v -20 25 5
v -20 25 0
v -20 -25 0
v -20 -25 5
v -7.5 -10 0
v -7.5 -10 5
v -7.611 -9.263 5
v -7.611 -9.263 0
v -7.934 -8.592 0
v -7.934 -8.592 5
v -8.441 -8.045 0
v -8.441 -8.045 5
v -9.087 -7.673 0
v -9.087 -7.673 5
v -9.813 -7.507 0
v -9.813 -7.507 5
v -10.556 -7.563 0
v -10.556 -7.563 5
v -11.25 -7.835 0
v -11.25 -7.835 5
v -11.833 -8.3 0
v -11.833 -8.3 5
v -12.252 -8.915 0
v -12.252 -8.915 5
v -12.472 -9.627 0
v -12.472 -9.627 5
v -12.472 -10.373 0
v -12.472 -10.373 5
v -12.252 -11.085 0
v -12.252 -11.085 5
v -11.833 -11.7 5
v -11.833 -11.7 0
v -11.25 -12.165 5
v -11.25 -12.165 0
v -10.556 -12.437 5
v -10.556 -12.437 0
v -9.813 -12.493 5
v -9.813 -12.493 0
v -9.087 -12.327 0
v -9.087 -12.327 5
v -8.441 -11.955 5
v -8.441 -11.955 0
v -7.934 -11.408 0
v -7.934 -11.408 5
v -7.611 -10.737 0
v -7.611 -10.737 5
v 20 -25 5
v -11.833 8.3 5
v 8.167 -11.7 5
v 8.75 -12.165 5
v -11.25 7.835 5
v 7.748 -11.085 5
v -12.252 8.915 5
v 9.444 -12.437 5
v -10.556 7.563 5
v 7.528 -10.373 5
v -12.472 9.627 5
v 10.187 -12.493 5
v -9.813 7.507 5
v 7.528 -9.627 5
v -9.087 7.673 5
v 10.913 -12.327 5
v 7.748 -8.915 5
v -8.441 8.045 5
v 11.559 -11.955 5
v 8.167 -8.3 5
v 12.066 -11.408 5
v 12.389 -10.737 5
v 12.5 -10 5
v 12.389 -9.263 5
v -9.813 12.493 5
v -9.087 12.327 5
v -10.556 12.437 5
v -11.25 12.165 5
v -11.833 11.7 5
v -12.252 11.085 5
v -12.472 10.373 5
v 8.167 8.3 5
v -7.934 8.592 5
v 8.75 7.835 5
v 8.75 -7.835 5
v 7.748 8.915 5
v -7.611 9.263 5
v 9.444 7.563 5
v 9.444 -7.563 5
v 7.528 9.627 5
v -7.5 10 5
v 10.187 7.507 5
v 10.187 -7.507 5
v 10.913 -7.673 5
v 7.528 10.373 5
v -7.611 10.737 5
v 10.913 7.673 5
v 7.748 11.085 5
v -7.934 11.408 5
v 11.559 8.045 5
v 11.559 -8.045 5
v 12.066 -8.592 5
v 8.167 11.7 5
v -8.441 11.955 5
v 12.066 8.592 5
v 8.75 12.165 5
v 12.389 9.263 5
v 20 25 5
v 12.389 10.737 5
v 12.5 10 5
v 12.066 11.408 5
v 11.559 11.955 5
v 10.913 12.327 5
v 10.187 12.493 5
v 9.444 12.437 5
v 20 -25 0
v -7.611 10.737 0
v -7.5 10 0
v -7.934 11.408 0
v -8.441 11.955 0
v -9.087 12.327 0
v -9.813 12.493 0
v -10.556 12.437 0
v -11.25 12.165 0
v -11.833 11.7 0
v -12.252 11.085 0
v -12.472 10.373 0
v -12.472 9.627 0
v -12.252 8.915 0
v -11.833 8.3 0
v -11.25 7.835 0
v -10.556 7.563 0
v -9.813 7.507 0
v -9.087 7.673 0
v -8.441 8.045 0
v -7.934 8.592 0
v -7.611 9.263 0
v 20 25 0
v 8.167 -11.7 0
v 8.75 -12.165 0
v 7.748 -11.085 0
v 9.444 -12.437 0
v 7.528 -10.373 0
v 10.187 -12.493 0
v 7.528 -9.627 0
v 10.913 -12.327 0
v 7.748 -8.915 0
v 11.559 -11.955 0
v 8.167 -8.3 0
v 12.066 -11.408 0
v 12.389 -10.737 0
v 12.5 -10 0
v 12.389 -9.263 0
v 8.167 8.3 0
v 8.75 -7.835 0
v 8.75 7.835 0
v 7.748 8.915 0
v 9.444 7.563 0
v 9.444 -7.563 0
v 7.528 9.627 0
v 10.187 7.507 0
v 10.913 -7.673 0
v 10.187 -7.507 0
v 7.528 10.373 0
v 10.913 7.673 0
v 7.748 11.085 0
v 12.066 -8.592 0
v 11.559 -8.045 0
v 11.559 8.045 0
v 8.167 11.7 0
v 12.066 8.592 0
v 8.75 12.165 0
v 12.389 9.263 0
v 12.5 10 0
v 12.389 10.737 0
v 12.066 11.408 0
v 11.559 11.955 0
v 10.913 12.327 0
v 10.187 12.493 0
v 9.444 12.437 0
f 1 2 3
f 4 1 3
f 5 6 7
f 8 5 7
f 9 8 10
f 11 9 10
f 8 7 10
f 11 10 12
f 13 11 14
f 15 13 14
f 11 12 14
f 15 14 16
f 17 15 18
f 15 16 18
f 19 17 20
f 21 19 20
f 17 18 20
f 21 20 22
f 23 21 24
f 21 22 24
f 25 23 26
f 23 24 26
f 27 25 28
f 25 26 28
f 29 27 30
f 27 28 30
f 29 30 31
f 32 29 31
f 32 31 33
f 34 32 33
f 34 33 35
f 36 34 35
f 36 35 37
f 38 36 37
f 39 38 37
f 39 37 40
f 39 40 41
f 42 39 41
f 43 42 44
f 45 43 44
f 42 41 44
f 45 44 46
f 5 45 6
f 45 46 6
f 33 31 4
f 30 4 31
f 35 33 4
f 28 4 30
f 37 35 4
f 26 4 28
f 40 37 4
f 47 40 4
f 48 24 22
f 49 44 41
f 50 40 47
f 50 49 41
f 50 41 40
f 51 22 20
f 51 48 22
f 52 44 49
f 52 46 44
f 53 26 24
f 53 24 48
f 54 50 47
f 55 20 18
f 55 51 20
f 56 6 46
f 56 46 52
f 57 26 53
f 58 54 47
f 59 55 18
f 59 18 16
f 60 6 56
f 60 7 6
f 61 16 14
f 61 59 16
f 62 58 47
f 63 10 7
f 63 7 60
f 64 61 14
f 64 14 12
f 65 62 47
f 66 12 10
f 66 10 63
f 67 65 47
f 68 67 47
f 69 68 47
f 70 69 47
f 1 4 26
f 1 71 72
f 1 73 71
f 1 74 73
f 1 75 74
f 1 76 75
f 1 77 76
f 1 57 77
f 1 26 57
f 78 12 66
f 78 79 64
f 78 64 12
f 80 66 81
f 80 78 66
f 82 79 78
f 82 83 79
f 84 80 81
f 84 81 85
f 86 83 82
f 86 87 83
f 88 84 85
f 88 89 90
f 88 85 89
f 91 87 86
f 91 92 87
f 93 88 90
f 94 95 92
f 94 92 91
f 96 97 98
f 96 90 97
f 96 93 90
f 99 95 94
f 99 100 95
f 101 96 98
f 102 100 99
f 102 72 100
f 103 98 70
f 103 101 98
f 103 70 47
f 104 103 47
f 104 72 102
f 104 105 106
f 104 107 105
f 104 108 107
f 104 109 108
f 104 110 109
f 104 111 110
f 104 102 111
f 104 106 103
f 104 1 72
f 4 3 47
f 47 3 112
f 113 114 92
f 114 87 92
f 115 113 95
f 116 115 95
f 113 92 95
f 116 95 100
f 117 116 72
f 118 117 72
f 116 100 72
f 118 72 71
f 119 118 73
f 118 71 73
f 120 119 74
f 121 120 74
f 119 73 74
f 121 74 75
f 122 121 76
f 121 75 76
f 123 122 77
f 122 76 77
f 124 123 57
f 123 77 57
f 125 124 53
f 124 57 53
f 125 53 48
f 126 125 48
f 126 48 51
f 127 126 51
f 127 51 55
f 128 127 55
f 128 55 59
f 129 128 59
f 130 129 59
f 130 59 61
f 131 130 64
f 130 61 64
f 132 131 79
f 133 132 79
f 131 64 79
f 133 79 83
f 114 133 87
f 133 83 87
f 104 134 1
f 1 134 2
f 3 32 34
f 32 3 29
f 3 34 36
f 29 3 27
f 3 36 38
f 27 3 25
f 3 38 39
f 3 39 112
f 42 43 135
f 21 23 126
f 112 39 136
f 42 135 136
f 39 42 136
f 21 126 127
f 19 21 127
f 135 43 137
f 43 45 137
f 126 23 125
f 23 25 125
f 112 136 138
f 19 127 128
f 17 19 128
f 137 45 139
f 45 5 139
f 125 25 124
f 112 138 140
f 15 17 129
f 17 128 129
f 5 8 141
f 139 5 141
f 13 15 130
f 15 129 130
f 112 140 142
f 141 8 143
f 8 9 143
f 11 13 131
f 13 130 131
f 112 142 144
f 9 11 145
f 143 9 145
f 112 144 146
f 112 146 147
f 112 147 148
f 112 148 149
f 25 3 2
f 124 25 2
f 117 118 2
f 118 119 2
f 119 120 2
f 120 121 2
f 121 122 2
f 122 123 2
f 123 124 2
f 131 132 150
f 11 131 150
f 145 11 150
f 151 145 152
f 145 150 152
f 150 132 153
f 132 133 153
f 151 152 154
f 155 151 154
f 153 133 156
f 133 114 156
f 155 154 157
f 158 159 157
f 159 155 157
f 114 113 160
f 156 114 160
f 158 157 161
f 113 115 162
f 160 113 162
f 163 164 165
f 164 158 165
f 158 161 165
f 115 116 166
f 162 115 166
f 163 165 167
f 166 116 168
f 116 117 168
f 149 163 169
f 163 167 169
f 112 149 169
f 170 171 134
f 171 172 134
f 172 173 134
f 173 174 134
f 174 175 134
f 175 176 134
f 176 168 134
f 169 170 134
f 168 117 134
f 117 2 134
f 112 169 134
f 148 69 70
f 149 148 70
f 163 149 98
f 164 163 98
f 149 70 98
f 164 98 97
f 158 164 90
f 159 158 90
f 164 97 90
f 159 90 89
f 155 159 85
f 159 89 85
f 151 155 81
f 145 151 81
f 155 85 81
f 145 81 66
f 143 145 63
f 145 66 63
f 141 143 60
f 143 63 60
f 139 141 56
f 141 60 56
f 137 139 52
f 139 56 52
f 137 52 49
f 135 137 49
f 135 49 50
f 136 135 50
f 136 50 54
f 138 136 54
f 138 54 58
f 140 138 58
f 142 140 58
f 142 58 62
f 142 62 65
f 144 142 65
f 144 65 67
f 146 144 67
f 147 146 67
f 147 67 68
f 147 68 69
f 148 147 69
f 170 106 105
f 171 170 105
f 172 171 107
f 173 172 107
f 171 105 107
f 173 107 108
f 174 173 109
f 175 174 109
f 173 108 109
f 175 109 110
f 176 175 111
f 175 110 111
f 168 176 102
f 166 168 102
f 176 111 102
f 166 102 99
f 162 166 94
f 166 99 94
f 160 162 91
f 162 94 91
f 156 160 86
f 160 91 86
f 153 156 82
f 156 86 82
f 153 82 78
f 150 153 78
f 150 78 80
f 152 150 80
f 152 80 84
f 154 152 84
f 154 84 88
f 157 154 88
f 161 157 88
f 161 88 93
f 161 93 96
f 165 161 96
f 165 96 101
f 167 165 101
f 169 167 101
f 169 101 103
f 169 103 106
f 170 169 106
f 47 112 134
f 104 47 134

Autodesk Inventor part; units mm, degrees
ref_plane "YZ Plane" through (0, 0, 0) normal (1, 0, 0) x (0, 1, 0)
ref_plane "XZ Plane" through (0, 0, 0) normal (0, 1, 0) x (-1, 0, 0)
ref_plane "XY Plane" through (0, 0, 0) normal (0, 0, 1) x (1, 0, 0)
sketch "Sketch1" plane through (0, 0, 0) normal (0, 0, 1) x (1, 0, 0)
  line L0 (-20, -25) -> (20, -25)
  line L1 (20, -25) -> (20, 25)
  line L2 (20, 25) -> (-20, 25)
  line L3 (-20, 25) -> (-20, -25)
  line L4 (-20, -25) -> (20, 25) construction
  line L5 (20, -25) -> (-20, 25) construction
  point P0 (0, 0)
  dimension "d0" = 40
  dimension "d1" = 50
extrude "Extrusion1" add sketch "Sketch1" along normal blind 5
sketch "Sketch2" plane through (0, 0, 5) normal (0, 0, 1) x (1, 0, 0)
  circle A0 centre (-10, 10) radius 2.5
  circle A1 centre (-10, -10) radius 2.5
  circle A2 centre (10, 10) radius 2.5
  circle A3 centre (10, -10) radius 2.5
  point P0 (0, 0)
  dimension "d4" = 5
  dimension "d5" = 5
  dimension "d6" = 5
  dimension "d7" = 5
  dimension "d8" = 10
  dimension "d9" = 10
  dimension "d10" = 10
  dimension "d11" = 10
extrude "Extrusion2" cut sketch "Sketch2" against normal through all
thread "Thread1" size "M5x0.8" class "6H" standard "ANSI Metric M Profile" full length
thread "Thread2" size "M5x0.8" class "6H" standard "ANSI Metric M Profile" full length
thread "Thread3" size "M5x0.8" class "6H" standard "ANSI Metric M Profile" full length
thread "Thread4" size "M5x0.8" class "6H" standard "ANSI Metric M Profile" full length
properties part number "CP010" material "ABS Plastic"
